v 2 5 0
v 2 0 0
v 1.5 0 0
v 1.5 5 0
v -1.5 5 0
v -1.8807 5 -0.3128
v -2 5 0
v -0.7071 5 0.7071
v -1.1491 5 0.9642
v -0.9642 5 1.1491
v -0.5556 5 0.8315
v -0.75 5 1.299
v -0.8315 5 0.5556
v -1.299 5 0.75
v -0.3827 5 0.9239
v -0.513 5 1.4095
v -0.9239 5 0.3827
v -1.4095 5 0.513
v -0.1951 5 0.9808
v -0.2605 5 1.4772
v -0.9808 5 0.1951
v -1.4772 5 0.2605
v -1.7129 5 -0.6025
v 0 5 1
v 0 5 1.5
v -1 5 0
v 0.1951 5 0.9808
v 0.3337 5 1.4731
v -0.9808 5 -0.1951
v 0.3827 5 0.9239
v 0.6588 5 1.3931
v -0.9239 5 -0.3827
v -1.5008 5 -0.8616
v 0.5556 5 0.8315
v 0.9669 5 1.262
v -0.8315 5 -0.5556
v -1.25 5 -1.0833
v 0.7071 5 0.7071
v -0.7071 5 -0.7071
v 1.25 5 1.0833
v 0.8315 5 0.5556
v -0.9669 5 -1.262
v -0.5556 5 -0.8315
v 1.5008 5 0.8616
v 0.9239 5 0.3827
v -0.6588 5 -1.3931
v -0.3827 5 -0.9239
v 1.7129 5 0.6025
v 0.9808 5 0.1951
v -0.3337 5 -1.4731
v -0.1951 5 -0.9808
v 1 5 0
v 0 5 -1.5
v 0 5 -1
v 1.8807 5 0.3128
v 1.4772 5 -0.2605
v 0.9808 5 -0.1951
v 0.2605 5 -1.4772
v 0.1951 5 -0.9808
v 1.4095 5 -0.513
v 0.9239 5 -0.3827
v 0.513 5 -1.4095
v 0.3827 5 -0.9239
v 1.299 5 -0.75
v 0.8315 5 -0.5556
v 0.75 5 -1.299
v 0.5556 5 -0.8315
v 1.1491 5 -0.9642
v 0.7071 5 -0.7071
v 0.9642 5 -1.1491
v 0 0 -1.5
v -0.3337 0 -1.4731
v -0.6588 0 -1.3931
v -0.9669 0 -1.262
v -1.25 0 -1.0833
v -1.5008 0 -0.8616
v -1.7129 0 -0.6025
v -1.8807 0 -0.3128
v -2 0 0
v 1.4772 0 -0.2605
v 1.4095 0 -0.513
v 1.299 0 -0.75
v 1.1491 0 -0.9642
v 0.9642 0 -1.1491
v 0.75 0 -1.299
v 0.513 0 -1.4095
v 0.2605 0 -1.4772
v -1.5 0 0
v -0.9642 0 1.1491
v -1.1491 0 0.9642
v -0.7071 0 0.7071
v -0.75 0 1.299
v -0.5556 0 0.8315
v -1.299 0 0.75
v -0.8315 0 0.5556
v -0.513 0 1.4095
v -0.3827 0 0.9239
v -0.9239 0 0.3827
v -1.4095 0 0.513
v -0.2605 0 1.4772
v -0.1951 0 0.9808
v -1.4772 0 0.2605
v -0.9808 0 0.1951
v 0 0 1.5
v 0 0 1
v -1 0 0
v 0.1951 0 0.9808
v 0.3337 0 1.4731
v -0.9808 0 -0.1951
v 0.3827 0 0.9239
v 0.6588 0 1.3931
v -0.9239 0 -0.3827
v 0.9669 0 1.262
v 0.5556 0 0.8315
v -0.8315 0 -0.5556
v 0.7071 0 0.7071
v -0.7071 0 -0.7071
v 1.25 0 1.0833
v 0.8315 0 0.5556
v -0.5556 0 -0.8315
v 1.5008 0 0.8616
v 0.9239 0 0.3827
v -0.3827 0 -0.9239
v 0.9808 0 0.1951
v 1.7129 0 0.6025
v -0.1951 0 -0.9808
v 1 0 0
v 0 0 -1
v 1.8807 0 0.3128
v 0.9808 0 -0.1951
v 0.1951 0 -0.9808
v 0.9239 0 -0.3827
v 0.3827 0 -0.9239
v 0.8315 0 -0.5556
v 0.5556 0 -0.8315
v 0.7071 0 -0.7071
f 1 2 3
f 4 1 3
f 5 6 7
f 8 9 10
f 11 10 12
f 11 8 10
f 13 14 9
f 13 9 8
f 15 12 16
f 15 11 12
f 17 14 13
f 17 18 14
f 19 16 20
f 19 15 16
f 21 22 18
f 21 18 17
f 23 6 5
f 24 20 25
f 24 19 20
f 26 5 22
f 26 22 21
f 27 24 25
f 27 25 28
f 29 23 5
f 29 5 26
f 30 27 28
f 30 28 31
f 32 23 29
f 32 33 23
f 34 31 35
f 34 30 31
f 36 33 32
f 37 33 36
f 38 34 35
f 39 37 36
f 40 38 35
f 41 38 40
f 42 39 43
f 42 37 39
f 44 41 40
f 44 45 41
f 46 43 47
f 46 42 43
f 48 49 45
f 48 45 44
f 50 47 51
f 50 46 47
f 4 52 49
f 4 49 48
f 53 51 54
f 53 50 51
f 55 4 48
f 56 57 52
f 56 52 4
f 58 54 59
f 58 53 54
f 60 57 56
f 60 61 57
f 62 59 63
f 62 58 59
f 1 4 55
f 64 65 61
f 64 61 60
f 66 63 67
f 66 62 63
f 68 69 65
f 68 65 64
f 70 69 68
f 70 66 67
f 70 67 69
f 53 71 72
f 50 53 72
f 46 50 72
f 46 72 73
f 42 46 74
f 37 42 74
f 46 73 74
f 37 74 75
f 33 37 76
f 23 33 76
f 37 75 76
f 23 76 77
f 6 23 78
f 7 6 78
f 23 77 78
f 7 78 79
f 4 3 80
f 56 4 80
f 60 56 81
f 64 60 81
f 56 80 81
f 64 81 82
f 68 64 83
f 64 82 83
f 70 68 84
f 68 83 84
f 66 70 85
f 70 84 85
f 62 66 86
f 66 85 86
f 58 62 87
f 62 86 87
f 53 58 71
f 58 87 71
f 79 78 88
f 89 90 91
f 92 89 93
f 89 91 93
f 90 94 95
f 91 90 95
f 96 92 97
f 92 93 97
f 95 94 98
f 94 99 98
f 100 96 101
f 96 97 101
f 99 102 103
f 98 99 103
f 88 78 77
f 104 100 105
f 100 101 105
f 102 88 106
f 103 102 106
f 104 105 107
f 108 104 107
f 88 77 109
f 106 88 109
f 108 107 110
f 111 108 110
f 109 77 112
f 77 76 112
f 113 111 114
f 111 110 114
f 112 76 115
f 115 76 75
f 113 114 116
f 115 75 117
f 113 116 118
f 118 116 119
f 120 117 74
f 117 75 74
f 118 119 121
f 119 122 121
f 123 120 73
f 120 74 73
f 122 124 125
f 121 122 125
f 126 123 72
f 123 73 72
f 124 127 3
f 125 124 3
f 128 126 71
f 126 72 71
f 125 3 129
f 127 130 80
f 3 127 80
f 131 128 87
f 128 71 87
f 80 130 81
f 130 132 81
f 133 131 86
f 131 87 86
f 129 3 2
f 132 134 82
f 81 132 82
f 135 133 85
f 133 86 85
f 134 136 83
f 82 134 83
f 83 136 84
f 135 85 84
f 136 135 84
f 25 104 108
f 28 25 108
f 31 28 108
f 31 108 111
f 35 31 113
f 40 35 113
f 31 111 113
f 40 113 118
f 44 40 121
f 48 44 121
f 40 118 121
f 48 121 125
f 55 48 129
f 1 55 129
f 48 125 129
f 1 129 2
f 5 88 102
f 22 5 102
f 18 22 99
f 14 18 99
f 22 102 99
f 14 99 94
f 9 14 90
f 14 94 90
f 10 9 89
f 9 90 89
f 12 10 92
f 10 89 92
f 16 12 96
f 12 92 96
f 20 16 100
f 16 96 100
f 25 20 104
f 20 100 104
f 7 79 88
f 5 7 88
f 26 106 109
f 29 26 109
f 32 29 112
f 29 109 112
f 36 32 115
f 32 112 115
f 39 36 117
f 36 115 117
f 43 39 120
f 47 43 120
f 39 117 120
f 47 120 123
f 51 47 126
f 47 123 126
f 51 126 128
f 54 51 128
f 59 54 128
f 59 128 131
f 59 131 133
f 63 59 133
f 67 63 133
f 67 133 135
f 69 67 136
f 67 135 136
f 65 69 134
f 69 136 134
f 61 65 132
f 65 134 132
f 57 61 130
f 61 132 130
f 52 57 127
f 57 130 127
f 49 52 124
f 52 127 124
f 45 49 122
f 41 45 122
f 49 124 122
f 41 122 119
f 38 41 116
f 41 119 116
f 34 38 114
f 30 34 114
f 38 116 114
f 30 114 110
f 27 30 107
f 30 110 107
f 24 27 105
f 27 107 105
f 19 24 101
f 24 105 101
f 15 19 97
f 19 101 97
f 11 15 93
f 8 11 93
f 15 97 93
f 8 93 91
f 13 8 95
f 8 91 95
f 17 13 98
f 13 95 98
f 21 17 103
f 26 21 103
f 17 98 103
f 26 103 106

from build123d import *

# Parameters (mm, degrees)
EXTRUDE_1_DEPTH = 5


with BuildPart() as part:
    # 스케치2 → 보스-돌출1 (new body)
    with BuildSketch(Plane(origin=(0, 0, 0), x_dir=(1, 0, 0), z_dir=(0, 1, 0))):
        with BuildLine():
            ThreePointArc((-1, 0), (0, 1), (1, 0))
            Line((1, 0), (1.5, 0))
            ThreePointArc((1.5, 0), (1.060660172, 1.060660172), (0, 1.5))
            ThreePointArc((0, 1.5), (-1.060660172, 1.060660172), (-1.5, 0))
            Line((-1.5, 0), (-1, 0))
        make_face()
        with BuildLine():
            Line((1.5, 0), (1, 0))
            ThreePointArc((1, 0), (0, -1), (-1, 0))
            Line((-1, 0), (-1.5, 0))
            ThreePointArc((-1.5, 0), (-1.060660172, -1.060660172), (0, -1.5))
            ThreePointArc((0, -1.5), (1.060660172, -1.060660172), (1.5, 0))
        make_face()
        with BuildLine():
            Line((2, 0), (1.5, 0))
            ThreePointArc((1.5, 0), (1.060660172, -1.060660172), (0, -1.5))
            ThreePointArc((0, -1.5), (1.25, -1.083333333), (2, 0))
        make_face()
        with BuildLine():
            ThreePointArc((-1.5, 0), (-1.060660172, 1.060660172), (0, 1.5))
            ThreePointArc((0, 1.5), (-1.25, 1.083333333), (-2, 0))
            Line((-2, 0), (-1.5, 0))
        make_face()
    extrude(amount=EXTRUDE_1_DEPTH)


solid = part.part
